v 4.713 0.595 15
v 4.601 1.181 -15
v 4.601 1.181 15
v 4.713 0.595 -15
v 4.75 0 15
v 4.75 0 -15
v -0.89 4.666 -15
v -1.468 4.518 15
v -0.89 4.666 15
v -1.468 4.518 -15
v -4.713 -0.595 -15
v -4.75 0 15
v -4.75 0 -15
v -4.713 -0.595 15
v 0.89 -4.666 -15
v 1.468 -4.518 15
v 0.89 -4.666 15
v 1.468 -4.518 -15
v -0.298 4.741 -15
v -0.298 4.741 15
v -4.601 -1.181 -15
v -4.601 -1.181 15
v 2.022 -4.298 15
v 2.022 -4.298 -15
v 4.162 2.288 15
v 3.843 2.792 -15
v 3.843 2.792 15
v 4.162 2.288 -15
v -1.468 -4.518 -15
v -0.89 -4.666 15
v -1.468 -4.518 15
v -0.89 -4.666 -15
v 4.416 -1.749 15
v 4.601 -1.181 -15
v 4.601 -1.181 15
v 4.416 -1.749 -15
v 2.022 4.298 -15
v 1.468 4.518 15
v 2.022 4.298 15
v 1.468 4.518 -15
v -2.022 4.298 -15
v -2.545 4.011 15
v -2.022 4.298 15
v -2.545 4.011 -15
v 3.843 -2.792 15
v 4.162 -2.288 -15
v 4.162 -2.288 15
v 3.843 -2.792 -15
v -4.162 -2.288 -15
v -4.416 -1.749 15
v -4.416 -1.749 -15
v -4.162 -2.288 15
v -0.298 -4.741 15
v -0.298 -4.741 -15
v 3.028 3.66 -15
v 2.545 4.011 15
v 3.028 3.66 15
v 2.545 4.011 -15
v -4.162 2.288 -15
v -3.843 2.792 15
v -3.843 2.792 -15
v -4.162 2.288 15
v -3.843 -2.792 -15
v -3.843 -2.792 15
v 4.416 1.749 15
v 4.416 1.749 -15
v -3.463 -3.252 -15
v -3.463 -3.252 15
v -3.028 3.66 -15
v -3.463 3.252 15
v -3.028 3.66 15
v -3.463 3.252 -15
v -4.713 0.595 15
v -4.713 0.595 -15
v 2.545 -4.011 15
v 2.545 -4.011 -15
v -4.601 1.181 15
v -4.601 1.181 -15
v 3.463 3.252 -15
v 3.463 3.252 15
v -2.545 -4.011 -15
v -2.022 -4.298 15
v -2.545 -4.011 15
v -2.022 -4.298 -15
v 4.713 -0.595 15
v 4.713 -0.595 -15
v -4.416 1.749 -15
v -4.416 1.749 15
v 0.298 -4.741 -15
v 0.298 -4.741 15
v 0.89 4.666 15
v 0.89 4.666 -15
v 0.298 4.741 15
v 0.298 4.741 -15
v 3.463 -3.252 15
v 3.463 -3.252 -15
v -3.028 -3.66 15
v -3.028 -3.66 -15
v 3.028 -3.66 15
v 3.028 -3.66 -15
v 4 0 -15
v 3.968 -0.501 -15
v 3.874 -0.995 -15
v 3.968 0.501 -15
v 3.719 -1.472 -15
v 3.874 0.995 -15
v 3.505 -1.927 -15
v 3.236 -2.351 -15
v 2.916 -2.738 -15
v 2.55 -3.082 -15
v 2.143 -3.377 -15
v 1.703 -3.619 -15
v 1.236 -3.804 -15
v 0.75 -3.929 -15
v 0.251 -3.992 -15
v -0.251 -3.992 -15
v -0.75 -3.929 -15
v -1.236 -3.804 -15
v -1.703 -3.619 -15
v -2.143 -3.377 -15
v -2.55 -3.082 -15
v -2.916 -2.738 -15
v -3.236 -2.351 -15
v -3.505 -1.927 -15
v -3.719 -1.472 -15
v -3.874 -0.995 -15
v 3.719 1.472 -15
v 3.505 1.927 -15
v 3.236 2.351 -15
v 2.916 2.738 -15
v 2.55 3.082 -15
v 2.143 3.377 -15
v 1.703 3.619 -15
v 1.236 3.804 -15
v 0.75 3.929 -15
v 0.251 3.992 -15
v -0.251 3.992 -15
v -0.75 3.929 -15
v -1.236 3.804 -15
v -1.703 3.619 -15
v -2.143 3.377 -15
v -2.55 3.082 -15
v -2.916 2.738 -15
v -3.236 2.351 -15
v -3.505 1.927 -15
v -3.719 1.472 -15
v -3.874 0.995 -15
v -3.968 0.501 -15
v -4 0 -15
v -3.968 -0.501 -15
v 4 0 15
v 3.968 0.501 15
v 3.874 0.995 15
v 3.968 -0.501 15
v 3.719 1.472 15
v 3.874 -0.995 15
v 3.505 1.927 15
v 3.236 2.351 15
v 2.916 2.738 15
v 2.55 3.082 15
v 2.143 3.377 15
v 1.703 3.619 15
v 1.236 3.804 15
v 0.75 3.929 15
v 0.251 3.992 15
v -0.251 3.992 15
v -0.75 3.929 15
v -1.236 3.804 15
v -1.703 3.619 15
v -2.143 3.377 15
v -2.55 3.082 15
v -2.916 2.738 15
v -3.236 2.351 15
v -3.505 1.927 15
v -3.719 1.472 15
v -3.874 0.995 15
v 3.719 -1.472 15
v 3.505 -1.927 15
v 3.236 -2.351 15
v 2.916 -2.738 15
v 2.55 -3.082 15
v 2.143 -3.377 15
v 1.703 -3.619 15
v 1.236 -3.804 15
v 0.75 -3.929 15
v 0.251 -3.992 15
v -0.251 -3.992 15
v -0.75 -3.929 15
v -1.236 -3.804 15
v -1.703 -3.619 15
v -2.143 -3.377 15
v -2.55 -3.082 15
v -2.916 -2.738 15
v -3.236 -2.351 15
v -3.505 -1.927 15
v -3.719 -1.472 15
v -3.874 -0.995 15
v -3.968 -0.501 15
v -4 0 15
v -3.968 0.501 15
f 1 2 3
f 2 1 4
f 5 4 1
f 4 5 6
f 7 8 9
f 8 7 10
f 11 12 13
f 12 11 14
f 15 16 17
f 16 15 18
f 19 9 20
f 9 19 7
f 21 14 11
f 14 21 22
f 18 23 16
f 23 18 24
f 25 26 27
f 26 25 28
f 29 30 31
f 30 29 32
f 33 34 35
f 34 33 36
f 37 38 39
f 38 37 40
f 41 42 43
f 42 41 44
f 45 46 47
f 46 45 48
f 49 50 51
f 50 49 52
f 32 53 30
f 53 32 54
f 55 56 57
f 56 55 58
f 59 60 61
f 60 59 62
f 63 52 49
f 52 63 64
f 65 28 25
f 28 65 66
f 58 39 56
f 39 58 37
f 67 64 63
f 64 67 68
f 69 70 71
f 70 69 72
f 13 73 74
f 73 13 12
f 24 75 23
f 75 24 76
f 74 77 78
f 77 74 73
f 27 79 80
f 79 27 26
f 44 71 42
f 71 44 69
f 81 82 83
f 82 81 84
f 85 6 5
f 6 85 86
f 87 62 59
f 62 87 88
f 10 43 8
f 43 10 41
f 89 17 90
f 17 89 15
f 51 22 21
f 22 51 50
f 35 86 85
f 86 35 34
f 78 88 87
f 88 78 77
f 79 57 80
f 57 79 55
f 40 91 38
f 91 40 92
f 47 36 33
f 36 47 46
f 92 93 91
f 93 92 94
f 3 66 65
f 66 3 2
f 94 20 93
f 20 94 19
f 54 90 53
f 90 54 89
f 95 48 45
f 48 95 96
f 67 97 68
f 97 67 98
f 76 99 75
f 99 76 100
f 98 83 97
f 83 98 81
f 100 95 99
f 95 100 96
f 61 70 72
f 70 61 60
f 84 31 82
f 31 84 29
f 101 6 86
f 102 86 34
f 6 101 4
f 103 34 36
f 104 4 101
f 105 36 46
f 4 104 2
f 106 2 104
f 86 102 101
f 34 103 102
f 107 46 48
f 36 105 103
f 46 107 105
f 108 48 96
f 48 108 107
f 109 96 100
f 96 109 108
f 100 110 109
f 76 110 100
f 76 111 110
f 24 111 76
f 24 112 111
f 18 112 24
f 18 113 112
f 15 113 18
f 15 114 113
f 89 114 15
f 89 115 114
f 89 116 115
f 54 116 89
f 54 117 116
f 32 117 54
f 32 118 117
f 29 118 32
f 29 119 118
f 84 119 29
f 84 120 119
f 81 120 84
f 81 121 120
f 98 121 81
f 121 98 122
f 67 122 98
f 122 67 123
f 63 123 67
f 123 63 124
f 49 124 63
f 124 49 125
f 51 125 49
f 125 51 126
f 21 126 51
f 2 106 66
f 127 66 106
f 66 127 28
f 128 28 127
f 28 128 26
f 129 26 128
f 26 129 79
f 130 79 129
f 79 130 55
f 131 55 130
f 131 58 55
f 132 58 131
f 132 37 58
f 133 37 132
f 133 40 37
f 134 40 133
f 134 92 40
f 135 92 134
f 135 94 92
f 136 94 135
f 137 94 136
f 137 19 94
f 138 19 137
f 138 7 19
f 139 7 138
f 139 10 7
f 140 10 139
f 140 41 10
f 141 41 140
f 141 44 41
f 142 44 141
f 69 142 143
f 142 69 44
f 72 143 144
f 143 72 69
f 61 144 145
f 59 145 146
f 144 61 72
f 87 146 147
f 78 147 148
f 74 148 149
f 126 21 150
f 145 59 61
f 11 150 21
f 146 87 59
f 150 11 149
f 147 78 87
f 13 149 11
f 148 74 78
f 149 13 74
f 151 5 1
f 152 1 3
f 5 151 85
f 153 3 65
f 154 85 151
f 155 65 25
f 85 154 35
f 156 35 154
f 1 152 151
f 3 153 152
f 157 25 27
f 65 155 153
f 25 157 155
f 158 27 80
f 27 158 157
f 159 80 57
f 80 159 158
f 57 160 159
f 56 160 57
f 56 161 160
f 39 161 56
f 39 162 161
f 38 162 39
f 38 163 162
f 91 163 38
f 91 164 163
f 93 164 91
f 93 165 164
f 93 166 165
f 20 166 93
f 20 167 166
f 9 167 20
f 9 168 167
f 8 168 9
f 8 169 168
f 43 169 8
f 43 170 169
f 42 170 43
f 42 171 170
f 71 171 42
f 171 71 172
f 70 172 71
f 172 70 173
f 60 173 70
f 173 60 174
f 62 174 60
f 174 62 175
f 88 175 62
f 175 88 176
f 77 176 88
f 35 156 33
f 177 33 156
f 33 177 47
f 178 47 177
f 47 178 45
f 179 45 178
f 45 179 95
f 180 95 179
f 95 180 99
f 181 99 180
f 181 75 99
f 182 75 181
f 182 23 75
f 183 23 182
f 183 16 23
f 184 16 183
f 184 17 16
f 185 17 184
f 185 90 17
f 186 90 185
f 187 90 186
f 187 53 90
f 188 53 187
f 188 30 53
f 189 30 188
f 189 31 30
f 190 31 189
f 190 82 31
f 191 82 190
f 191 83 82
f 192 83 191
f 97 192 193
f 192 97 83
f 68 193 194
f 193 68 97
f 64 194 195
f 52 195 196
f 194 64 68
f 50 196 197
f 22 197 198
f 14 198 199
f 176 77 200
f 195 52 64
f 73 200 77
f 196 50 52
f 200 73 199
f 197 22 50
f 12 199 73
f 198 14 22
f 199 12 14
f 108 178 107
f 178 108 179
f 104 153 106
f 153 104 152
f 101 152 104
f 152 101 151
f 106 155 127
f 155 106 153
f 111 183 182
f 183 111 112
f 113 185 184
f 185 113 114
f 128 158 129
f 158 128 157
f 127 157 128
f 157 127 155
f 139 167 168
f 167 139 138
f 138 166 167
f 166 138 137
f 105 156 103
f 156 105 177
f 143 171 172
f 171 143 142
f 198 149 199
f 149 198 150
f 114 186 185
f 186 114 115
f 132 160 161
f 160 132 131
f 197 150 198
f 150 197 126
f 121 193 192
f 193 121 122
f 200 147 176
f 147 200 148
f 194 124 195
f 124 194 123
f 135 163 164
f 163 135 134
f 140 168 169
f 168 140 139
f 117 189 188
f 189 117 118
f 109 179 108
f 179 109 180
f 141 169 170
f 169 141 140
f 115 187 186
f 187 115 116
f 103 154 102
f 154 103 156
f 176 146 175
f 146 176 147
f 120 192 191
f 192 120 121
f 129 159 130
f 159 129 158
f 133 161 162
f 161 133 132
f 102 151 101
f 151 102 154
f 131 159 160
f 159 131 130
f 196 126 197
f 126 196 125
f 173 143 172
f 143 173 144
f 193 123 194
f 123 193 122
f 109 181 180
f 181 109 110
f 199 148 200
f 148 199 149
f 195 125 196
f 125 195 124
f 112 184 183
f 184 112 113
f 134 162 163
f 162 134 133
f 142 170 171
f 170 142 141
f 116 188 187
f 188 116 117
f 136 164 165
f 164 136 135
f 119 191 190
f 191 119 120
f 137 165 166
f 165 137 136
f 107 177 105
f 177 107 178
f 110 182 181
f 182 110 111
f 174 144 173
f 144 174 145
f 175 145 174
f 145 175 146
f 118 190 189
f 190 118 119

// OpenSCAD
$fn = 50;


difference() {
	union() {
		translate(v = [0, 0, -15.0000000000]) {
			cylinder(h = 30, r = 4.7500000000);
		}
	}
	union() {
		translate(v = [0, 0, -100.0000000000]) {
			cylinder(h = 200, r = 4.0000000000);
		}
	}
}
